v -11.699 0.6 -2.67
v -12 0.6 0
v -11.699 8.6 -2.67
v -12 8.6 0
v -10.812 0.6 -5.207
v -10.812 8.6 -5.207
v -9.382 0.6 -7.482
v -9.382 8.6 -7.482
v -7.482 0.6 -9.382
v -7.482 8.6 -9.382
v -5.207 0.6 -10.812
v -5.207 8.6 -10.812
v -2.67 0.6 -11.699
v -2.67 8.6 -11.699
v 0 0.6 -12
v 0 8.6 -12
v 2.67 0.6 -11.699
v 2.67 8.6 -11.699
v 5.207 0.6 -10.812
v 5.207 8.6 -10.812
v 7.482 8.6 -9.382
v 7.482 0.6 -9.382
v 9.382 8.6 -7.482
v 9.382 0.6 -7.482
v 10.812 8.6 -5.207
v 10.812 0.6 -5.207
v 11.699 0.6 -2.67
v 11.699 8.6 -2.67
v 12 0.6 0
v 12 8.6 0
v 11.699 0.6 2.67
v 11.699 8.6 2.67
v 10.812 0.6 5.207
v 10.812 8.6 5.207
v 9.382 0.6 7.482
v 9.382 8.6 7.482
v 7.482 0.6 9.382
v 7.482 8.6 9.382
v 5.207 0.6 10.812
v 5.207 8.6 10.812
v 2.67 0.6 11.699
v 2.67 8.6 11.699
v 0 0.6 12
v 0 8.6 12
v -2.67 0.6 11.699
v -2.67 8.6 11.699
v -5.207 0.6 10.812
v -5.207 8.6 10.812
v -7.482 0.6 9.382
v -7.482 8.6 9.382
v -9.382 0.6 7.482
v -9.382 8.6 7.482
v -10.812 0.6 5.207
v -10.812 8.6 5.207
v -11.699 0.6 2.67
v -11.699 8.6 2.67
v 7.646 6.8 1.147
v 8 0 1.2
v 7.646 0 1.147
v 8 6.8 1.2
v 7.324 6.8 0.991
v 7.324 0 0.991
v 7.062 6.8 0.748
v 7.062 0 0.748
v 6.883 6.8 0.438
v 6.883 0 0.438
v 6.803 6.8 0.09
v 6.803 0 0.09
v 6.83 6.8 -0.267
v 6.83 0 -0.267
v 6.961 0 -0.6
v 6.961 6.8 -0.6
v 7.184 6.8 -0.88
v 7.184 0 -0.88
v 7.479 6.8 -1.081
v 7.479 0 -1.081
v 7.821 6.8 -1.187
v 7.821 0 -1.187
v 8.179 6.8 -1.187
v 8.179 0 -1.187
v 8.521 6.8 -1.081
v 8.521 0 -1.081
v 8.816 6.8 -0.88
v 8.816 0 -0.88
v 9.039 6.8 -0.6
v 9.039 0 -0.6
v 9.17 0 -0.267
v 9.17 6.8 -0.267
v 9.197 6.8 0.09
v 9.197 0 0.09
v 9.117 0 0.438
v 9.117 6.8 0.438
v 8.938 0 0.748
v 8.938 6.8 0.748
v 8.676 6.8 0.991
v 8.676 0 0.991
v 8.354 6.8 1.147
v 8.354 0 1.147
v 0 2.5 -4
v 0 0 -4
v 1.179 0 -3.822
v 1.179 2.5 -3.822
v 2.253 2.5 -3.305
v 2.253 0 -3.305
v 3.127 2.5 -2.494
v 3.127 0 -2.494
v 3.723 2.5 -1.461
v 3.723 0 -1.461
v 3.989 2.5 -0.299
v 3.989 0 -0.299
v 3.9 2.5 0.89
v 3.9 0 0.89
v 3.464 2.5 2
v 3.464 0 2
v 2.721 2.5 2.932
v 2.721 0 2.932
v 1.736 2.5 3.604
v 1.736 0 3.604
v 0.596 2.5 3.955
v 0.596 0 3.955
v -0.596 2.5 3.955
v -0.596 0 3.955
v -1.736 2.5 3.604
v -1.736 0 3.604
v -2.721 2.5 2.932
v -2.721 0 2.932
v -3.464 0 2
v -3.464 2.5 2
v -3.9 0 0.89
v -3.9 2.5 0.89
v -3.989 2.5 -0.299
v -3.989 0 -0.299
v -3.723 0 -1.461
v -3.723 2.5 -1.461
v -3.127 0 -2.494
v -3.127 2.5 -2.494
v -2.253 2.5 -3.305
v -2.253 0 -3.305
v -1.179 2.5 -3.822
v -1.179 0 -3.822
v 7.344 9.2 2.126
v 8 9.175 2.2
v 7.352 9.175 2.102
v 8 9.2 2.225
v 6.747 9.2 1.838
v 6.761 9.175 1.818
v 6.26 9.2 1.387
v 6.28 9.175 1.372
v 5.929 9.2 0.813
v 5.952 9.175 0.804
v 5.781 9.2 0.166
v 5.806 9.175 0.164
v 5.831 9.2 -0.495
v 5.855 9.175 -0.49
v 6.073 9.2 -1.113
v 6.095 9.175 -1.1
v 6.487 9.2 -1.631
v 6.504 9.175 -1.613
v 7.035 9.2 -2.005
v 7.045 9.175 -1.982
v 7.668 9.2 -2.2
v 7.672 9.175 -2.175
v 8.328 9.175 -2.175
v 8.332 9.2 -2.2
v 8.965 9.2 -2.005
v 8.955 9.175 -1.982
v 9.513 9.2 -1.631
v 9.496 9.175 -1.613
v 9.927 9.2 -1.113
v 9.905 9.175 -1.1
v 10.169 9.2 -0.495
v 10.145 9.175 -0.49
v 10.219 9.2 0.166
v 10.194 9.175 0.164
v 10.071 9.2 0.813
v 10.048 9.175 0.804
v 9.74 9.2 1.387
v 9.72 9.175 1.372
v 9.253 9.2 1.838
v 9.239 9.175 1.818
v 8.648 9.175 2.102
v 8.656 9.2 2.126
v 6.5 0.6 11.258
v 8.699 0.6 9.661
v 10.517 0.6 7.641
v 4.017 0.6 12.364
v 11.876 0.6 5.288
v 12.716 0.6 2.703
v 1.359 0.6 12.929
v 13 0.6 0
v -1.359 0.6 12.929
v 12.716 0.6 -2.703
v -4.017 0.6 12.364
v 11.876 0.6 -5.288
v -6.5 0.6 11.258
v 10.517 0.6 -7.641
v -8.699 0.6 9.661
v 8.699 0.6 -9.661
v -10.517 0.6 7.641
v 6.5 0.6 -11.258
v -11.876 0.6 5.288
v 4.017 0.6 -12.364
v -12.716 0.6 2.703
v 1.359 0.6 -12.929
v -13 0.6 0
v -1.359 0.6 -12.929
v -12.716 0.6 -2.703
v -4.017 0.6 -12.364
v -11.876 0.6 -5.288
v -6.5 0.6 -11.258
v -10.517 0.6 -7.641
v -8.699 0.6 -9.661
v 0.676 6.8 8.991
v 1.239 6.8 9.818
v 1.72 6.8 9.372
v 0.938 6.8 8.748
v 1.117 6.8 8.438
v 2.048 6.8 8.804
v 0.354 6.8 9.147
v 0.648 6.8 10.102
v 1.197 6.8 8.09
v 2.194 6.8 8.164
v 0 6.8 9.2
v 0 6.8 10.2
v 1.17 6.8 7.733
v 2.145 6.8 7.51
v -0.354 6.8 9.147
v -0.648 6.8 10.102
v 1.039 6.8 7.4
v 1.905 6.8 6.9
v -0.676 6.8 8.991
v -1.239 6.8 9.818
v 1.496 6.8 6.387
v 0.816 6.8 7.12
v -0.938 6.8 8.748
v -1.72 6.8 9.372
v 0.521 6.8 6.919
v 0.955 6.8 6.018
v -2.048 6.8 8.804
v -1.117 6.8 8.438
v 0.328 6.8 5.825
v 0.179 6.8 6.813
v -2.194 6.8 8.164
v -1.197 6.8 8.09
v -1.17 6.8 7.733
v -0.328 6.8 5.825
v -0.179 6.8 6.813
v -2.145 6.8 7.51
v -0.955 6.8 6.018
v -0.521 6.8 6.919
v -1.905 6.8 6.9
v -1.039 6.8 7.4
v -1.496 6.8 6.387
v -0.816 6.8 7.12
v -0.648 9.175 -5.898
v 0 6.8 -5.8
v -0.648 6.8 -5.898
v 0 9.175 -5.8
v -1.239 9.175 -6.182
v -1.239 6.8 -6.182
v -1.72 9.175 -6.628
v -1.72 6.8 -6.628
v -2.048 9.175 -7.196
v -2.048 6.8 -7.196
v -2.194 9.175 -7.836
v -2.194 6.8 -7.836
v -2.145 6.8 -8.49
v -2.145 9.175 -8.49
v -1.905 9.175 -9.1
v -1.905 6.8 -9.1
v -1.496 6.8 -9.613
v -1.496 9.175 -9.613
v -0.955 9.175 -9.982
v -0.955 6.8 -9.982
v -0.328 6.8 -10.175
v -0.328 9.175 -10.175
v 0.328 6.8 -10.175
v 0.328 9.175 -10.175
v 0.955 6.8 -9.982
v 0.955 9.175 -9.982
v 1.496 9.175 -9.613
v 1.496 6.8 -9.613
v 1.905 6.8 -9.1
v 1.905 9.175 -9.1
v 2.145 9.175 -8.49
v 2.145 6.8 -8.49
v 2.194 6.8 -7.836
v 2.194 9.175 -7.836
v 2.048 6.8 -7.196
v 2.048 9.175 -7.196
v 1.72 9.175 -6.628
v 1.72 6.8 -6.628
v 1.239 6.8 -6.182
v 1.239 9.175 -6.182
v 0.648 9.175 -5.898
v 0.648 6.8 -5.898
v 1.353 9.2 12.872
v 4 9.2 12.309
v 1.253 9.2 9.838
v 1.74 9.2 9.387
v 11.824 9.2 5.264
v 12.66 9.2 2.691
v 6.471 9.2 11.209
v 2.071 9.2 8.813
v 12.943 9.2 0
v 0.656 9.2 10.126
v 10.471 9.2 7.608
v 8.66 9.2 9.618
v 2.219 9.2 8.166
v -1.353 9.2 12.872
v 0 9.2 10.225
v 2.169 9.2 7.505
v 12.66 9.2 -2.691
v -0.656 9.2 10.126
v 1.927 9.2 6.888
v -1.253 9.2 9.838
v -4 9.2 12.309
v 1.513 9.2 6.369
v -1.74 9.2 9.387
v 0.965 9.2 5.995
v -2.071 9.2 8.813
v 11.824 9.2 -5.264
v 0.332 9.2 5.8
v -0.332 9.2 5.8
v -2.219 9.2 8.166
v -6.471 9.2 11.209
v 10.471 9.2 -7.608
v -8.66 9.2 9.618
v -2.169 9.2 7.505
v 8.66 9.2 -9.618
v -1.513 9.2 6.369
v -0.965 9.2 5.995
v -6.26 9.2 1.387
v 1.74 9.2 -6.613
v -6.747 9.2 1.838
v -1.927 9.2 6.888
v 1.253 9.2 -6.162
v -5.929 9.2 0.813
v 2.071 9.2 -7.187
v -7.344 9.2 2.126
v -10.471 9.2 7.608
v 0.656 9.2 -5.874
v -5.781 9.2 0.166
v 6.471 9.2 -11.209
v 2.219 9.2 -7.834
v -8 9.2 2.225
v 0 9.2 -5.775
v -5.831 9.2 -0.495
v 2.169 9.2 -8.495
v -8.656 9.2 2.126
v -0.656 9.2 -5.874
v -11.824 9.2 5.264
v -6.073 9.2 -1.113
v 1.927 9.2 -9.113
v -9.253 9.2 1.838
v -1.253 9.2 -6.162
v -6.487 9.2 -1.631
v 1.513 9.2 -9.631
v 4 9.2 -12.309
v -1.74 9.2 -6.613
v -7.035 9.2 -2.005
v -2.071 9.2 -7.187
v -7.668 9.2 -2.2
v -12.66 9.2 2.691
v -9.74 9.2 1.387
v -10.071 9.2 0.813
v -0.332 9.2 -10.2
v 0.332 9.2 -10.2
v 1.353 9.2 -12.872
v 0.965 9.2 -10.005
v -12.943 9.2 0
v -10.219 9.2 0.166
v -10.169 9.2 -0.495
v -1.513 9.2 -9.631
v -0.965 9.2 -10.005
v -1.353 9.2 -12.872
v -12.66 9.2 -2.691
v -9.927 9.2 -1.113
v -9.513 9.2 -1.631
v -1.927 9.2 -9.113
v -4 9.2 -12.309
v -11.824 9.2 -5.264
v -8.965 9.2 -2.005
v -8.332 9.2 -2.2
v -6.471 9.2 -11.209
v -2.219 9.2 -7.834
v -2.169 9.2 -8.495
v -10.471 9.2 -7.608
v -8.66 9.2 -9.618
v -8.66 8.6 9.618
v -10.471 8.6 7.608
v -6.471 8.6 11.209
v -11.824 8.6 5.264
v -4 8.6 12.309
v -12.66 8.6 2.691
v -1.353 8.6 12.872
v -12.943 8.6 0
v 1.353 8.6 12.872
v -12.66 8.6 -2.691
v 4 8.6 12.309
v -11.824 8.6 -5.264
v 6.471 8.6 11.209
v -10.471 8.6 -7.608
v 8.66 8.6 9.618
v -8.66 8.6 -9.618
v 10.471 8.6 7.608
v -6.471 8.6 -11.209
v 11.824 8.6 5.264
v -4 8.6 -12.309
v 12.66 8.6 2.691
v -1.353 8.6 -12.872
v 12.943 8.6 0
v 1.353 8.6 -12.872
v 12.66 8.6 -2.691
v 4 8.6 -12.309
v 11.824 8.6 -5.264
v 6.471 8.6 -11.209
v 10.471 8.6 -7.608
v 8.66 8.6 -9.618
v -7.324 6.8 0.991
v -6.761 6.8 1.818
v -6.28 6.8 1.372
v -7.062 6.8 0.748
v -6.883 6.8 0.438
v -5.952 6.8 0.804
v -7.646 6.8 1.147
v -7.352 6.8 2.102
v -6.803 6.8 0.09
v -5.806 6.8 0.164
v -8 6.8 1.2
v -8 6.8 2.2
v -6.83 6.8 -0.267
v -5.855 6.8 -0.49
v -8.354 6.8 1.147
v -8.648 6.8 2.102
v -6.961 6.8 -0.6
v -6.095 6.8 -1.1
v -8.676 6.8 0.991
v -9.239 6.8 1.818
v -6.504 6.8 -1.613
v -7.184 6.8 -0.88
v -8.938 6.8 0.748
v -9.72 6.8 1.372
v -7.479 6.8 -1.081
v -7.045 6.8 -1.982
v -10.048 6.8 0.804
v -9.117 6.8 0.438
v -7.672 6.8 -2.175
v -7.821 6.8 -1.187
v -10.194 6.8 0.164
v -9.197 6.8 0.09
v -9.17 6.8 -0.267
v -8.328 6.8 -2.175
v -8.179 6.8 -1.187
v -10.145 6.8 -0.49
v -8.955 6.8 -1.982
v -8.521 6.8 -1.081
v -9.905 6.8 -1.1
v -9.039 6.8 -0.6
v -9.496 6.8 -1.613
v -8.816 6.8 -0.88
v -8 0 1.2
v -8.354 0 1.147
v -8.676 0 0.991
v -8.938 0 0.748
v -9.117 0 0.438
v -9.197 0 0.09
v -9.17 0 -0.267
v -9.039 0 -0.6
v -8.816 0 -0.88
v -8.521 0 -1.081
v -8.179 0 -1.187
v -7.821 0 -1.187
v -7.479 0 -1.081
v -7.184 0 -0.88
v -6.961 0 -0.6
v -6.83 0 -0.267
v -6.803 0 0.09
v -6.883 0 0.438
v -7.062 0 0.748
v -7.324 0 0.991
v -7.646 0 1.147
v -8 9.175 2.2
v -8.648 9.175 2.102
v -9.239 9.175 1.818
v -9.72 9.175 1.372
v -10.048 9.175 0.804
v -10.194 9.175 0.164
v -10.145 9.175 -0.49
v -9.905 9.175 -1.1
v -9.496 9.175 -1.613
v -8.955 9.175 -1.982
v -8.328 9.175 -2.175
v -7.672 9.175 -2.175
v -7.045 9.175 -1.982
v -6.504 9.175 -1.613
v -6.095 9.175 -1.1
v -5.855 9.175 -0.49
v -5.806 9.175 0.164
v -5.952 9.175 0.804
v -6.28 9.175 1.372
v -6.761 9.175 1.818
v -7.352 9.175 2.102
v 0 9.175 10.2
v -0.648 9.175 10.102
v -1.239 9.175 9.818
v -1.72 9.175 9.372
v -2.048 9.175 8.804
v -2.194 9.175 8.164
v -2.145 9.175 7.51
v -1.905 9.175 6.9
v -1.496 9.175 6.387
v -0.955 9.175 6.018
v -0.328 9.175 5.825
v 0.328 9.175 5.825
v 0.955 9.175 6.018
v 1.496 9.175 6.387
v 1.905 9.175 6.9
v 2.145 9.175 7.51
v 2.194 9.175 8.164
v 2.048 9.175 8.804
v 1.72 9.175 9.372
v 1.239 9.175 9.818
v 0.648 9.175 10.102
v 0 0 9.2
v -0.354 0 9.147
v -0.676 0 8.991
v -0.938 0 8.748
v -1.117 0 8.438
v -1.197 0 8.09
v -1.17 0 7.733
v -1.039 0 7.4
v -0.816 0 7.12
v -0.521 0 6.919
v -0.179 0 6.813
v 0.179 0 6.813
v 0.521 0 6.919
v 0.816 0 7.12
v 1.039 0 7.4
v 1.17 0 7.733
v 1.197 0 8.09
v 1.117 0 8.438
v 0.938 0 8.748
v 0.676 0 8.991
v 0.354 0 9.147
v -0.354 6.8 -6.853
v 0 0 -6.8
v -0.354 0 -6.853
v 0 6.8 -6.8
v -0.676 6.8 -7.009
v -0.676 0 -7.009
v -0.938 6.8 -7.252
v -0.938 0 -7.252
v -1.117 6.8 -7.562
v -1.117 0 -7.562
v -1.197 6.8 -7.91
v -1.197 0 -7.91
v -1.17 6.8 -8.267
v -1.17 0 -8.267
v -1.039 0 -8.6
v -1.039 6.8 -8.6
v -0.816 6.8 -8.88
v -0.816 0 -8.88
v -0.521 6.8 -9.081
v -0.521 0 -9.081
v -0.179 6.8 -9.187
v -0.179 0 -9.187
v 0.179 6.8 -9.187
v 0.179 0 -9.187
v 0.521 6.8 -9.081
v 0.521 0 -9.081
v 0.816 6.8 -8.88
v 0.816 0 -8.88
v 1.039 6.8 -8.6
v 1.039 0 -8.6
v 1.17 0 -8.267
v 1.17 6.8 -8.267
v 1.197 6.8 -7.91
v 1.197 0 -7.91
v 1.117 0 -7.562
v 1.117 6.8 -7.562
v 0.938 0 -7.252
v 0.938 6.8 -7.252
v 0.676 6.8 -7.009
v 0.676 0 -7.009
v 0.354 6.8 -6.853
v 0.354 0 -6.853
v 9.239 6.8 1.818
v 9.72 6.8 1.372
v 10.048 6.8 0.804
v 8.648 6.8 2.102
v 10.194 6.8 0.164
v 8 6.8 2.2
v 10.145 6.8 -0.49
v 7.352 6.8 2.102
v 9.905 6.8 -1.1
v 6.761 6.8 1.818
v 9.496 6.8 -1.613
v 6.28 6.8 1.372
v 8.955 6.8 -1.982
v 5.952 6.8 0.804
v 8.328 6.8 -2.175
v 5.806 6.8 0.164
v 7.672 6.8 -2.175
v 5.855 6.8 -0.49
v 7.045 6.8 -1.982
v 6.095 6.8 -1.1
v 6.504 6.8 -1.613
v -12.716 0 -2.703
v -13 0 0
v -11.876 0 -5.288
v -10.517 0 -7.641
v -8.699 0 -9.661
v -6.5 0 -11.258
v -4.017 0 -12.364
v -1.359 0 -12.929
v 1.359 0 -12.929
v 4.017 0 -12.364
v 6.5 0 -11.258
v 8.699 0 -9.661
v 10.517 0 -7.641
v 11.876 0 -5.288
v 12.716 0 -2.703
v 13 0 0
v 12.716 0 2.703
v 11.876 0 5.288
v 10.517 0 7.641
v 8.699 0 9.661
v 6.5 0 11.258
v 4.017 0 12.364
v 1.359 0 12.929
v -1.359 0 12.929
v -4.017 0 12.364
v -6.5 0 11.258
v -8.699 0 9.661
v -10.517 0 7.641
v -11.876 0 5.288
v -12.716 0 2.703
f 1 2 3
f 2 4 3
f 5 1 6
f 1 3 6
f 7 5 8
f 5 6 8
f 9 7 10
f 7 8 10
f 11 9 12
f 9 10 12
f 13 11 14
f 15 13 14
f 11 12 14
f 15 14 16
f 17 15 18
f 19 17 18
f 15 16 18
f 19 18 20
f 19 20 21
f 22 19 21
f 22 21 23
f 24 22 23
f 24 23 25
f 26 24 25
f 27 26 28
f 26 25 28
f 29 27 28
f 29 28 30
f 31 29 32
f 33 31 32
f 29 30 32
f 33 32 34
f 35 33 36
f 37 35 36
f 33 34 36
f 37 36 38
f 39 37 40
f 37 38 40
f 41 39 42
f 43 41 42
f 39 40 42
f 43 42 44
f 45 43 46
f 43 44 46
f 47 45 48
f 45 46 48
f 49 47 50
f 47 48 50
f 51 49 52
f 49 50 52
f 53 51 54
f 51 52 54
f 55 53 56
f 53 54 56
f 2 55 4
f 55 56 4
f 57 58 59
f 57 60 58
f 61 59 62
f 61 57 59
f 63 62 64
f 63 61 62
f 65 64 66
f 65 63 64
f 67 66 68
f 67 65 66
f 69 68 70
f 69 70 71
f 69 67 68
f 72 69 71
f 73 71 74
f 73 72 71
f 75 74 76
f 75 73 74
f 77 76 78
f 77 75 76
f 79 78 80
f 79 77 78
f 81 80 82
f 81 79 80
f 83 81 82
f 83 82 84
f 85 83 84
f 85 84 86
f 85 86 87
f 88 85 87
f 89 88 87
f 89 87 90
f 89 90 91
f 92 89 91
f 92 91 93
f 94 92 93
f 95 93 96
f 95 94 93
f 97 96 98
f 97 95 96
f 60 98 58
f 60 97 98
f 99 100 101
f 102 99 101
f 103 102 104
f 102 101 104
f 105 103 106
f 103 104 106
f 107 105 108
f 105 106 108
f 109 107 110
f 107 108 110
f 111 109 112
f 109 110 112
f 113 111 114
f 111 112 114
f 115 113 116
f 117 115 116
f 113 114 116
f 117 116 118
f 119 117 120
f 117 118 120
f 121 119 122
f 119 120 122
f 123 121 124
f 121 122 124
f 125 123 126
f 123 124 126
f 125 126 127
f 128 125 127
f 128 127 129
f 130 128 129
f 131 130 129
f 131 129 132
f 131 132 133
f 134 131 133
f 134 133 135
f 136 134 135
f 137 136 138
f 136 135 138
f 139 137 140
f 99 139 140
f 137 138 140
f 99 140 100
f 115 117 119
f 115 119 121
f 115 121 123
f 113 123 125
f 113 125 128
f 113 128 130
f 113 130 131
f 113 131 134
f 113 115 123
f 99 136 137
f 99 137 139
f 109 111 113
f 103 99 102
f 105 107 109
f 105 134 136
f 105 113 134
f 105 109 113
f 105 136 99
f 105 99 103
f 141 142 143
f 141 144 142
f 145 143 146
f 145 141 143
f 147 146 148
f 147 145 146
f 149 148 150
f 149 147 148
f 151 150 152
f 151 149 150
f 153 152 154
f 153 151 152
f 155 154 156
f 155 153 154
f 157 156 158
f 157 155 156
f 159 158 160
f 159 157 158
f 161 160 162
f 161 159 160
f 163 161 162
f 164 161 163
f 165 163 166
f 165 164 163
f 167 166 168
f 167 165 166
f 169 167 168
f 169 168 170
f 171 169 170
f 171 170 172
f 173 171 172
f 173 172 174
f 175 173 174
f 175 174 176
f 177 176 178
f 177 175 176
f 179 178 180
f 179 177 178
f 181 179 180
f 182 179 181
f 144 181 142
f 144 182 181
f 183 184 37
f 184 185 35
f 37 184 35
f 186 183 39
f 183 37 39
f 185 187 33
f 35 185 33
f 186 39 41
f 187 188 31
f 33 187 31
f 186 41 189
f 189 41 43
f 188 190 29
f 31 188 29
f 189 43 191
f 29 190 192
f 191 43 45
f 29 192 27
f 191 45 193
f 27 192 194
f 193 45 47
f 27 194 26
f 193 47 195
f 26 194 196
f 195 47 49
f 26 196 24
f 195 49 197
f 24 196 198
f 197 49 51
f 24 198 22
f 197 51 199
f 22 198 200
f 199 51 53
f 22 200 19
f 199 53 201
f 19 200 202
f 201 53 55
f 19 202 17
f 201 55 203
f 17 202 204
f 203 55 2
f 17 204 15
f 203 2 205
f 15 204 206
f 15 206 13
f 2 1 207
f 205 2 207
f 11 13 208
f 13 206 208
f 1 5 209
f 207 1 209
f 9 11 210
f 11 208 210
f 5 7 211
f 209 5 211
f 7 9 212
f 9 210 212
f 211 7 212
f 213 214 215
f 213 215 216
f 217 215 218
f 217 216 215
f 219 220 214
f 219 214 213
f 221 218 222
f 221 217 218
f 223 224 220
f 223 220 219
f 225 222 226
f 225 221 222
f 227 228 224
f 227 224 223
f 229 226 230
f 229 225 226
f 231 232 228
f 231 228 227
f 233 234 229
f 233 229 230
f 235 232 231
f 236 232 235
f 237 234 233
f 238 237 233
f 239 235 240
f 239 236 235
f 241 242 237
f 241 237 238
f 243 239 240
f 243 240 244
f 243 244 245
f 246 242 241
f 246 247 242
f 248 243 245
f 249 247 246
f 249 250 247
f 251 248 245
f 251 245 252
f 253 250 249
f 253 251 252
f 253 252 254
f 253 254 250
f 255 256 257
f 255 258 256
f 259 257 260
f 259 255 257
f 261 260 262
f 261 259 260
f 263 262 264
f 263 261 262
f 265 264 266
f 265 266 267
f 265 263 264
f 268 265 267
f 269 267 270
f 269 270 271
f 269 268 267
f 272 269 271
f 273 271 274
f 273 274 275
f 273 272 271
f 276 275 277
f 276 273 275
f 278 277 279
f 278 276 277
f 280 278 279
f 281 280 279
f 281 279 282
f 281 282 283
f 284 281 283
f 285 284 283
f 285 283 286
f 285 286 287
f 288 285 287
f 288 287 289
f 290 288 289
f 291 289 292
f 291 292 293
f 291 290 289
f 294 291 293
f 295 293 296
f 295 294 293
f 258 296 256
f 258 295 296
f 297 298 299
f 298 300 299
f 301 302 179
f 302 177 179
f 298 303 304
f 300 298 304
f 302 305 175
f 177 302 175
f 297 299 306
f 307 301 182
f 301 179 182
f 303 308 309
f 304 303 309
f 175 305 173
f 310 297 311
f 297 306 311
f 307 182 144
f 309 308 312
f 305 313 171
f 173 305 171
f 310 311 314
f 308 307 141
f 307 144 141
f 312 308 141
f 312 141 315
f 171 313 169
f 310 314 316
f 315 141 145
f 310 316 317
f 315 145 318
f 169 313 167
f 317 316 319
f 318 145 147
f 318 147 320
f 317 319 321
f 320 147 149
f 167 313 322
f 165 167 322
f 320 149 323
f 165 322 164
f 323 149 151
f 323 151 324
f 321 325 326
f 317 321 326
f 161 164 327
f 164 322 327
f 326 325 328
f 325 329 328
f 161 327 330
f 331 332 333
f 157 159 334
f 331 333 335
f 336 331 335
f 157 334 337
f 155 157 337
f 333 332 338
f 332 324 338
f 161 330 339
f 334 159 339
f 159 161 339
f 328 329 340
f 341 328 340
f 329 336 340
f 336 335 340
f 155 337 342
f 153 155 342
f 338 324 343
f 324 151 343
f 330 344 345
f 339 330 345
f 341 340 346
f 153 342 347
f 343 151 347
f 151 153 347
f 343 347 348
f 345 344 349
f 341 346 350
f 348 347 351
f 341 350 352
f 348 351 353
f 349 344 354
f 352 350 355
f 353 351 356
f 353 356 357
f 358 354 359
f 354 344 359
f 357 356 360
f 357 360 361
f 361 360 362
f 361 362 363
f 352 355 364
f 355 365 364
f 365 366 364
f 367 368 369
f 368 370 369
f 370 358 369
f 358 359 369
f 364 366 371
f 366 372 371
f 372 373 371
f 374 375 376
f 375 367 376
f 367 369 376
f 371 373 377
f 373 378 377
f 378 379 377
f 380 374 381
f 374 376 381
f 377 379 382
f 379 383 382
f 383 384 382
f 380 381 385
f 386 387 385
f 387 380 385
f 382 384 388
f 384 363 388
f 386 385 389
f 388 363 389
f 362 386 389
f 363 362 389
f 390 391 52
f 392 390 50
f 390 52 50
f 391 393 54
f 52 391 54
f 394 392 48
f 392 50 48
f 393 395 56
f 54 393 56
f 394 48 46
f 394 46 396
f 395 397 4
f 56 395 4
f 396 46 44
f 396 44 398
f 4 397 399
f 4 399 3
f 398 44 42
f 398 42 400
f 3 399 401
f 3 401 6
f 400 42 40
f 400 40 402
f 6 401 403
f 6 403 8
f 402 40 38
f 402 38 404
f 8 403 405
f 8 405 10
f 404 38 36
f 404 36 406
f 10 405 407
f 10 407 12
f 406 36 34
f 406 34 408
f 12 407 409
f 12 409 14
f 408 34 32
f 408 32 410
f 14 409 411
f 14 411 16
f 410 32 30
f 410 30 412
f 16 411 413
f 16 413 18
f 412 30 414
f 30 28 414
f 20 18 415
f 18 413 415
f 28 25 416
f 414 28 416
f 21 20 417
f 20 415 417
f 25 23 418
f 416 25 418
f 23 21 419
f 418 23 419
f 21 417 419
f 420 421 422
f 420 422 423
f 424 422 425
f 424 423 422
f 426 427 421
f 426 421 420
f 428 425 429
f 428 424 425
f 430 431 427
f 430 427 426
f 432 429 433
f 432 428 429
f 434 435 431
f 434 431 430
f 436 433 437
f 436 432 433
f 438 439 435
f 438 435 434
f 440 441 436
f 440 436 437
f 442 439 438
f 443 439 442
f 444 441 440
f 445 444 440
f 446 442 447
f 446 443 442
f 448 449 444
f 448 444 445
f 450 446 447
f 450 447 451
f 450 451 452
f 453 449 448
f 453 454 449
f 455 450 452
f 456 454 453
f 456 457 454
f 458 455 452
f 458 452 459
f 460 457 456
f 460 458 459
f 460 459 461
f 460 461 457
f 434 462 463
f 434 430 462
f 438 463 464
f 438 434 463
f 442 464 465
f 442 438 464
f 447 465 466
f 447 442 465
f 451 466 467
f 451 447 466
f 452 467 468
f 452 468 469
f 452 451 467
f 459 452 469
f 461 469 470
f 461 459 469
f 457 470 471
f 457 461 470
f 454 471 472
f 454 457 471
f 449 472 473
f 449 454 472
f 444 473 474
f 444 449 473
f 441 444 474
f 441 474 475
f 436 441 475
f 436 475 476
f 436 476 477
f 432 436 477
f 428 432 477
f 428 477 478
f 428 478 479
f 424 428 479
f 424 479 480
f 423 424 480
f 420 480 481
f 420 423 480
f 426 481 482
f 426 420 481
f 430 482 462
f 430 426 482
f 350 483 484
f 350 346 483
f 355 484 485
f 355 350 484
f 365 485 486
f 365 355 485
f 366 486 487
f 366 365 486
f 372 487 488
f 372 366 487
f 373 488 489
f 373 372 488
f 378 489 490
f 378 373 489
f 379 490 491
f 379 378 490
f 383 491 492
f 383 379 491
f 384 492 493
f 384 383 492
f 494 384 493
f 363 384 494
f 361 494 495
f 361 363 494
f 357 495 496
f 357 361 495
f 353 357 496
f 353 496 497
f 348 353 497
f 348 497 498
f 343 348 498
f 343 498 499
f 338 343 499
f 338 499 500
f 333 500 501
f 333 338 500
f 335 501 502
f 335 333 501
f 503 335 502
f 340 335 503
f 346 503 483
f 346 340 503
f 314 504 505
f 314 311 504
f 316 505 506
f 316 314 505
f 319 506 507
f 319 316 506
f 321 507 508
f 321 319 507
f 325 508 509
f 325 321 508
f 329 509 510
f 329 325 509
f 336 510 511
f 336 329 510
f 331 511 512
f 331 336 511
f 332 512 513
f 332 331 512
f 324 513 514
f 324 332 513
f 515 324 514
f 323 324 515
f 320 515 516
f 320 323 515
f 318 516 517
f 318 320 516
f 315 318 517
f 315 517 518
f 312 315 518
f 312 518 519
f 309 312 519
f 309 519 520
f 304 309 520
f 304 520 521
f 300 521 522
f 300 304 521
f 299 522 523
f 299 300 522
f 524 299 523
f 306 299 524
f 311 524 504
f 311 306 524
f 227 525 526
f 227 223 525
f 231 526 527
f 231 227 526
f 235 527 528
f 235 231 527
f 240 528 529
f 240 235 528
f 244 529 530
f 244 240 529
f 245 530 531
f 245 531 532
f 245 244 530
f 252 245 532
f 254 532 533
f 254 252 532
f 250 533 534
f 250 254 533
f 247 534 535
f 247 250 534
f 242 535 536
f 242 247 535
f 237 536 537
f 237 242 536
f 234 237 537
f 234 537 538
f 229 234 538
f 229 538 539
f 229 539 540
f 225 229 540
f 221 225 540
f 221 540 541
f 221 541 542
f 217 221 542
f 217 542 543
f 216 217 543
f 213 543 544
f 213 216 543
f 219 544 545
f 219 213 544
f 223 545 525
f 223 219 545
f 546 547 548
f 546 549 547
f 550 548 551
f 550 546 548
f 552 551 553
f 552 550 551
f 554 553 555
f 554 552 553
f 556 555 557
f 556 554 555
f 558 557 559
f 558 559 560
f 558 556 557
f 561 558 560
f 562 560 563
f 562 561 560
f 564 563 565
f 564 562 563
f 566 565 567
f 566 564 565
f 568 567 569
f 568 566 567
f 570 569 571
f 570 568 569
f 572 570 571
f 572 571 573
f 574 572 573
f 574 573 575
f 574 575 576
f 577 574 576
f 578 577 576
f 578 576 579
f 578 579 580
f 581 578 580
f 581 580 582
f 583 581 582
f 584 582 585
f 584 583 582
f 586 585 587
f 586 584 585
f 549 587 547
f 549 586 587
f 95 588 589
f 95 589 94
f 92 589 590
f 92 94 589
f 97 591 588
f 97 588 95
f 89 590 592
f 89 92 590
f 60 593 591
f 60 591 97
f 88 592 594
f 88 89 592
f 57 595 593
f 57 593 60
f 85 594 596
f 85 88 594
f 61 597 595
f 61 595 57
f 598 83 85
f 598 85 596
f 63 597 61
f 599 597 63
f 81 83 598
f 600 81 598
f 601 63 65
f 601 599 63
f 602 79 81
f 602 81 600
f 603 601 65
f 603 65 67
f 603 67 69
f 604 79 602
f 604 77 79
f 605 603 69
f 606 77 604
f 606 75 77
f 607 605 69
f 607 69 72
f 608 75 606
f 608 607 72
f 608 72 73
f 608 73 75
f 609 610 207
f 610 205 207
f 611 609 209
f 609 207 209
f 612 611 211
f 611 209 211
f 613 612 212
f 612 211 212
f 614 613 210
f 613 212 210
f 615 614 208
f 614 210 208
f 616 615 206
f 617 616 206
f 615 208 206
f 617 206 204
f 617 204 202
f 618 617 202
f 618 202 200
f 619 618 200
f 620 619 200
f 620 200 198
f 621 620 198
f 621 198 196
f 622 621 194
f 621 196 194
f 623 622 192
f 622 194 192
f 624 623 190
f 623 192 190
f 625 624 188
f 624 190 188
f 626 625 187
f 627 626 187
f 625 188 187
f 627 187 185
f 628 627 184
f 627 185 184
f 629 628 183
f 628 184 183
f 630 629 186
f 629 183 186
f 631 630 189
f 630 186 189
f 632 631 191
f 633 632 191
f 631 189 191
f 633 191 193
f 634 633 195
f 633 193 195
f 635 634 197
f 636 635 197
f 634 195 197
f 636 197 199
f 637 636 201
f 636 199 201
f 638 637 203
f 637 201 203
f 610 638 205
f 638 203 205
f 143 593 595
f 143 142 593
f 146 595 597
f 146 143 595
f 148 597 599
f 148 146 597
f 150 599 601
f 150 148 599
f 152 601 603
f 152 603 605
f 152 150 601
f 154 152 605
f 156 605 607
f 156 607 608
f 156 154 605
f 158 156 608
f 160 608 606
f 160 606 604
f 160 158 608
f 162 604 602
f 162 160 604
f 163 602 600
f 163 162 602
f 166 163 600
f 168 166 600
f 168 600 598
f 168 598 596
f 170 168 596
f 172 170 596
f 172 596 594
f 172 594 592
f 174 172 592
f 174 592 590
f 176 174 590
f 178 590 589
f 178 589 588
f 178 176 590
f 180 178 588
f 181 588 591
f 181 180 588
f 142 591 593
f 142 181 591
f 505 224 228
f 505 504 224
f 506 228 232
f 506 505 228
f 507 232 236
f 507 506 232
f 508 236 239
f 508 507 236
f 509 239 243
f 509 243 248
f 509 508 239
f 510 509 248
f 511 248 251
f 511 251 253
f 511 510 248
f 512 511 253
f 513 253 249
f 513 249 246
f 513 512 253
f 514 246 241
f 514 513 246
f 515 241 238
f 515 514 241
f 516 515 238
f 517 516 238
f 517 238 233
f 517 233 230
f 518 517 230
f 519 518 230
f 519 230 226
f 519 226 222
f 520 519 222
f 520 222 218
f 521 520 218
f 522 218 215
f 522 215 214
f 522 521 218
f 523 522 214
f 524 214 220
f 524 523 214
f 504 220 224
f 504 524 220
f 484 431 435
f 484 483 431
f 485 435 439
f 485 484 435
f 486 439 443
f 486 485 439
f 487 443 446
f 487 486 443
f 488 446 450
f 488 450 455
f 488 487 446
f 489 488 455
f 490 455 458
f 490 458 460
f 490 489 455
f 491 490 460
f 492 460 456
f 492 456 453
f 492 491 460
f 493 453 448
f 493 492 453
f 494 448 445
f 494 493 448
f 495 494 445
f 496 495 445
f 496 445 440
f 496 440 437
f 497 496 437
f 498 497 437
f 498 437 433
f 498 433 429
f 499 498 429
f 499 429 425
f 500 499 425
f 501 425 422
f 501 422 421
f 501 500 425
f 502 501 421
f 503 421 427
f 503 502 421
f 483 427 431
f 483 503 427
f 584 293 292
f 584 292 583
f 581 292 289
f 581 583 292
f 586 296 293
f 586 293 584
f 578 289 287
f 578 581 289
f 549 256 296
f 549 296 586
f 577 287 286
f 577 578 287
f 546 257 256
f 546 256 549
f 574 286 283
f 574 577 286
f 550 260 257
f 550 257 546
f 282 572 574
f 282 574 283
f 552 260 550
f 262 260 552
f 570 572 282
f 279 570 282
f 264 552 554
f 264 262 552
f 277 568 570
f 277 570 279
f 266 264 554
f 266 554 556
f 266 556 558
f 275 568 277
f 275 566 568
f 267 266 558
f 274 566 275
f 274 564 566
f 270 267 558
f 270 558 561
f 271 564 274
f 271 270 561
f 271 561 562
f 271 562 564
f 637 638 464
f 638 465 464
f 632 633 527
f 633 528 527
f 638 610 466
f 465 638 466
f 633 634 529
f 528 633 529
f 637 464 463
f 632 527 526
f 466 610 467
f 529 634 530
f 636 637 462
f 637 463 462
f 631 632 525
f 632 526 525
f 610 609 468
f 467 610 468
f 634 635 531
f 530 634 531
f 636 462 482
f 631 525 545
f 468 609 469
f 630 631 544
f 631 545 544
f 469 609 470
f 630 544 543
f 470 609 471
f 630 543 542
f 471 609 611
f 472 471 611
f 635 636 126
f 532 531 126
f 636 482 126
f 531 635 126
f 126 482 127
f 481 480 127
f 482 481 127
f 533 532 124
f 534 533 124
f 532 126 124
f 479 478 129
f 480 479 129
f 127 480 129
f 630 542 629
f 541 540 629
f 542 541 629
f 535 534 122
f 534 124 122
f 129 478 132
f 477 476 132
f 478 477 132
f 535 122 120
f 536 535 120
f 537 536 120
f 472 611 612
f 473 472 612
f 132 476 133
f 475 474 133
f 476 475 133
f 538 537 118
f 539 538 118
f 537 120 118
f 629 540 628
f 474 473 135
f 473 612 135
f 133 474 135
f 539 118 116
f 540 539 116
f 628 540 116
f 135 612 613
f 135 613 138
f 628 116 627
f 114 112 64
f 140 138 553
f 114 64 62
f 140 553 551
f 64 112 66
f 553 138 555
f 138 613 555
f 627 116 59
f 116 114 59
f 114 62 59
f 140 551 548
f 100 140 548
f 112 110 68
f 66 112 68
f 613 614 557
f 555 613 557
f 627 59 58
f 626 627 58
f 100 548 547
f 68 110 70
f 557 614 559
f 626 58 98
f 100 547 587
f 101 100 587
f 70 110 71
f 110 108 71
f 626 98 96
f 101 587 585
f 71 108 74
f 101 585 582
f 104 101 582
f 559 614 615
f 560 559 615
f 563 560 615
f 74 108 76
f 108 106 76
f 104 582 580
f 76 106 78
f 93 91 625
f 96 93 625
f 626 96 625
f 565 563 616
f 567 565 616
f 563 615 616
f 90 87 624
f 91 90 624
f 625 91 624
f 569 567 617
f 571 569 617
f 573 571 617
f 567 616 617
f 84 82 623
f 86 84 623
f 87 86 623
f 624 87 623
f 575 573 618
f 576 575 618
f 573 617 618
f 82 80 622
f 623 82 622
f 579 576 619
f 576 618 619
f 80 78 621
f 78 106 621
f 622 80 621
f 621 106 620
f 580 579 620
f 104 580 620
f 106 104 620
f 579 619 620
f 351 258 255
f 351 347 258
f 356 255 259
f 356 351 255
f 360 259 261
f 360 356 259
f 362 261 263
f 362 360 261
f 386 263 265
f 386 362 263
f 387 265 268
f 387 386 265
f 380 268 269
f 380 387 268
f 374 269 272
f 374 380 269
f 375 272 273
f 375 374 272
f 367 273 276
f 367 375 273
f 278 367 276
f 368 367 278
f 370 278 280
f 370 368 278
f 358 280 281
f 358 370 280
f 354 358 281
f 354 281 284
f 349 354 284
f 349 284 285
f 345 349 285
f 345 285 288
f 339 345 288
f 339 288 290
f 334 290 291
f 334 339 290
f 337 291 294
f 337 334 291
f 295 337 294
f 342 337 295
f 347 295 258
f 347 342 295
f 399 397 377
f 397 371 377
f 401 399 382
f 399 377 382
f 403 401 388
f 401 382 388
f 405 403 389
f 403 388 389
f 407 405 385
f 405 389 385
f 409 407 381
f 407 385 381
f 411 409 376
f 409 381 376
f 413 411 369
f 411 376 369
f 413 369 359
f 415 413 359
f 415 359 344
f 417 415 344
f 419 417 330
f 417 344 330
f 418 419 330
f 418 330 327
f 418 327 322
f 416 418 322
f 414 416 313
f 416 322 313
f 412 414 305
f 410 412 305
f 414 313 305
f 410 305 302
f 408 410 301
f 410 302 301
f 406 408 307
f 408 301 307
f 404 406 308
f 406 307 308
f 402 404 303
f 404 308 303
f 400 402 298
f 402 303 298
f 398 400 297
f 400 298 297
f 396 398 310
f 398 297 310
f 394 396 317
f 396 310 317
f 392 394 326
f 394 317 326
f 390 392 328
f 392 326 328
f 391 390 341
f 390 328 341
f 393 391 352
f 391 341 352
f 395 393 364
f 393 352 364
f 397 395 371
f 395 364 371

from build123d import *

# Parameters (mm, degrees)
CBORE_FOR_M2_HEX_SOCKET_HEAD_CAP_SCR_2_COUNT = 2
CBORE_FOR_M2_HEX_SOCKET_HEAD_CAP_SCR_2_PITCH = 11.313708499
CBORE_FOR_M2_HEX_SOCKET_HEAD_CAP_SCR_3_COUNT = 2
CBORE_FOR_M2_HEX_SOCKET_HEAD_CAP_SCR_3_PITCH = 16
CBORE_FOR_M2_HEX_SOCKET_HEAD_CAP_SCR_4_COUNT = 2
CBORE_FOR_M2_HEX_SOCKET_HEAD_CAP_SCR_4_PITCH = 11.313708499
SKETCH6_R                                    = 4
CUT_EXTRUDE1_DEPTH                           = 2.5


with BuildPart() as part:
    # Sketch1 → Revolve1 (revolve)
    with BuildSketch(Plane.XY, mode=Mode.PRIVATE) as revolve1_sk:
        Polygon((0, 0), (13, 0), (13, 0.6), (12, 0.6), (12, 8.6), (12.942857143, 8.6), (12.942857143, 9.2), (0, 9.2), align=None)
    revolve(revolve1_sk.sketch.rotate(Axis((0, 9.2, 0), (0, -1, 0)), 180), axis=Axis((0, 9.2, 0), (0, -1, 0)))

    # Sketch3 → CBORE for M2 Hex Socket Head Cap Screw1 (revolve, cut)
    with BuildSketch(Plane(origin=(-8, 9.2, 0), x_dir=(0, 0, 1), z_dir=(1, 0, 0))):
        Polygon((0, 0), (0, 9.2), (1.2, 9.2), (1.2, 2.4), (2.2, 2.4), (2.2, 0.025), (2.225, 0), align=None)
    cbore_for_m2_hex_socket_head_cap_screw1 = revolve(axis=Axis((-8, 15.55, 0), (0, -1, 0)), mode=Mode.SUBTRACT)

    # CBORE for M2 Hex Socket Head Cap Scr 2: CBORE for M2 Hex Socket Head Cap Screw1 ×2
    with Locations(*[Vector(0.7071067811865277, 0, -0.7071067811865673) * (i * CBORE_FOR_M2_HEX_SOCKET_HEAD_CAP_SCR_2_PITCH) for i in range(1, CBORE_FOR_M2_HEX_SOCKET_HEAD_CAP_SCR_2_COUNT)]):
        add(cbore_for_m2_hex_socket_head_cap_screw1, mode=Mode.SUBTRACT)

    # CBORE for M2 Hex Socket Head Cap Scr 3: CBORE for M2 Hex Socket Head Cap Screw1 ×2
    with Locations(*[(i * CBORE_FOR_M2_HEX_SOCKET_HEAD_CAP_SCR_3_PITCH, 0, 0) for i in range(1, CBORE_FOR_M2_HEX_SOCKET_HEAD_CAP_SCR_3_COUNT)]):
        add(cbore_for_m2_hex_socket_head_cap_screw1, mode=Mode.SUBTRACT)

    # CBORE for M2 Hex Socket Head Cap Scr 4: CBORE for M2 Hex Socket Head Cap Screw1 ×2
    with Locations(*[Vector(0.7071067811865674, 0, 0.7071067811865276) * (i * CBORE_FOR_M2_HEX_SOCKET_HEAD_CAP_SCR_4_PITCH) for i in range(1, CBORE_FOR_M2_HEX_SOCKET_HEAD_CAP_SCR_4_COUNT)]):
        add(cbore_for_m2_hex_socket_head_cap_screw1, mode=Mode.SUBTRACT)

    # Sketch6 → Cut-Extrude1 (cut)
    with BuildSketch(Plane.XZ):
        with Locations(Location((0, 0, 0), (0, 0, 270))):
            Circle(SKETCH6_R)
    extrude(amount=-CUT_EXTRUDE1_DEPTH, mode=Mode.SUBTRACT)


solid = part.part
